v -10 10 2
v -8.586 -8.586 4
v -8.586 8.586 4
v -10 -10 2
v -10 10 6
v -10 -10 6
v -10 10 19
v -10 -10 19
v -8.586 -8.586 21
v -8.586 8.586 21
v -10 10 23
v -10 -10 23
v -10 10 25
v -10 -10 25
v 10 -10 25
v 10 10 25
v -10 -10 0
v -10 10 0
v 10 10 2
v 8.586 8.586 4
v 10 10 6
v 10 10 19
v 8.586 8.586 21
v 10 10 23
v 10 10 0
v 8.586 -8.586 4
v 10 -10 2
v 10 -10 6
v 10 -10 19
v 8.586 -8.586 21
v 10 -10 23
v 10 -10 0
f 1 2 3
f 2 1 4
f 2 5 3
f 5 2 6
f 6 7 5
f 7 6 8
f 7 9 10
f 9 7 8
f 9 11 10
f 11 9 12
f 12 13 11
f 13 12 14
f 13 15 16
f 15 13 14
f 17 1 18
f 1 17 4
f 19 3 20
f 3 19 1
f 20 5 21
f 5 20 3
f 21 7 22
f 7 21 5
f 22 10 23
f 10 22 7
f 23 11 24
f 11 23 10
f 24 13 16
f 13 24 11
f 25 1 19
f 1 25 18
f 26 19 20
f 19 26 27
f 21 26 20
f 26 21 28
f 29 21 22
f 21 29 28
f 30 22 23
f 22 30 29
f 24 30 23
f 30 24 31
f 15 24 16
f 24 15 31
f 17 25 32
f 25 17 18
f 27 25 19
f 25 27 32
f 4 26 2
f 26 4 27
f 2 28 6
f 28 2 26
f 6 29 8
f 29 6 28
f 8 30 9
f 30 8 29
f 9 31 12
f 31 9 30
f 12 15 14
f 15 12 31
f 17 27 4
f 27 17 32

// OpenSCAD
H=25;
L=20*sqrt(2);
l=4/sqrt(2);

module bloco(){
	rotate(45)
	rotate_extrude($fn=4)
	difference(){
		square([L/2,H]);

		translate([L/2,l*sqrt(2)])
		rotate(45) square([l,l], center=true);
	
		translate([L/2,H-l*sqrt(2)])
		rotate(45) square([l,l], center=true);
	}
}

module cardinal(){
	cardinal_mascara();
	cardinal_bico();
}

module cardinal_bico(){
	linear_extrude(height=2)
	import("cardinal.dxf", layer="bico");
}

module cardinal_mascara(){
	linear_extrude(height=1)
	import("cardinal.dxf", layer="mascara");
}

e = 1;
union(){
difference(){
	bloco();

	for (i=[0:3])
	rotate(i*90)
	translate([-10,10+0.1,3])
	rotate([90,0])
	linear_extrude(height=e)
	import("cardinal.dxf", layer="mascara");
}
	for (i=[0:3])
	rotate(i*90)
	translate([-10,10+e,3])
	rotate([90,0])
	linear_extrude(height=e)
	import("cardinal.dxf", layer="bico");
}
